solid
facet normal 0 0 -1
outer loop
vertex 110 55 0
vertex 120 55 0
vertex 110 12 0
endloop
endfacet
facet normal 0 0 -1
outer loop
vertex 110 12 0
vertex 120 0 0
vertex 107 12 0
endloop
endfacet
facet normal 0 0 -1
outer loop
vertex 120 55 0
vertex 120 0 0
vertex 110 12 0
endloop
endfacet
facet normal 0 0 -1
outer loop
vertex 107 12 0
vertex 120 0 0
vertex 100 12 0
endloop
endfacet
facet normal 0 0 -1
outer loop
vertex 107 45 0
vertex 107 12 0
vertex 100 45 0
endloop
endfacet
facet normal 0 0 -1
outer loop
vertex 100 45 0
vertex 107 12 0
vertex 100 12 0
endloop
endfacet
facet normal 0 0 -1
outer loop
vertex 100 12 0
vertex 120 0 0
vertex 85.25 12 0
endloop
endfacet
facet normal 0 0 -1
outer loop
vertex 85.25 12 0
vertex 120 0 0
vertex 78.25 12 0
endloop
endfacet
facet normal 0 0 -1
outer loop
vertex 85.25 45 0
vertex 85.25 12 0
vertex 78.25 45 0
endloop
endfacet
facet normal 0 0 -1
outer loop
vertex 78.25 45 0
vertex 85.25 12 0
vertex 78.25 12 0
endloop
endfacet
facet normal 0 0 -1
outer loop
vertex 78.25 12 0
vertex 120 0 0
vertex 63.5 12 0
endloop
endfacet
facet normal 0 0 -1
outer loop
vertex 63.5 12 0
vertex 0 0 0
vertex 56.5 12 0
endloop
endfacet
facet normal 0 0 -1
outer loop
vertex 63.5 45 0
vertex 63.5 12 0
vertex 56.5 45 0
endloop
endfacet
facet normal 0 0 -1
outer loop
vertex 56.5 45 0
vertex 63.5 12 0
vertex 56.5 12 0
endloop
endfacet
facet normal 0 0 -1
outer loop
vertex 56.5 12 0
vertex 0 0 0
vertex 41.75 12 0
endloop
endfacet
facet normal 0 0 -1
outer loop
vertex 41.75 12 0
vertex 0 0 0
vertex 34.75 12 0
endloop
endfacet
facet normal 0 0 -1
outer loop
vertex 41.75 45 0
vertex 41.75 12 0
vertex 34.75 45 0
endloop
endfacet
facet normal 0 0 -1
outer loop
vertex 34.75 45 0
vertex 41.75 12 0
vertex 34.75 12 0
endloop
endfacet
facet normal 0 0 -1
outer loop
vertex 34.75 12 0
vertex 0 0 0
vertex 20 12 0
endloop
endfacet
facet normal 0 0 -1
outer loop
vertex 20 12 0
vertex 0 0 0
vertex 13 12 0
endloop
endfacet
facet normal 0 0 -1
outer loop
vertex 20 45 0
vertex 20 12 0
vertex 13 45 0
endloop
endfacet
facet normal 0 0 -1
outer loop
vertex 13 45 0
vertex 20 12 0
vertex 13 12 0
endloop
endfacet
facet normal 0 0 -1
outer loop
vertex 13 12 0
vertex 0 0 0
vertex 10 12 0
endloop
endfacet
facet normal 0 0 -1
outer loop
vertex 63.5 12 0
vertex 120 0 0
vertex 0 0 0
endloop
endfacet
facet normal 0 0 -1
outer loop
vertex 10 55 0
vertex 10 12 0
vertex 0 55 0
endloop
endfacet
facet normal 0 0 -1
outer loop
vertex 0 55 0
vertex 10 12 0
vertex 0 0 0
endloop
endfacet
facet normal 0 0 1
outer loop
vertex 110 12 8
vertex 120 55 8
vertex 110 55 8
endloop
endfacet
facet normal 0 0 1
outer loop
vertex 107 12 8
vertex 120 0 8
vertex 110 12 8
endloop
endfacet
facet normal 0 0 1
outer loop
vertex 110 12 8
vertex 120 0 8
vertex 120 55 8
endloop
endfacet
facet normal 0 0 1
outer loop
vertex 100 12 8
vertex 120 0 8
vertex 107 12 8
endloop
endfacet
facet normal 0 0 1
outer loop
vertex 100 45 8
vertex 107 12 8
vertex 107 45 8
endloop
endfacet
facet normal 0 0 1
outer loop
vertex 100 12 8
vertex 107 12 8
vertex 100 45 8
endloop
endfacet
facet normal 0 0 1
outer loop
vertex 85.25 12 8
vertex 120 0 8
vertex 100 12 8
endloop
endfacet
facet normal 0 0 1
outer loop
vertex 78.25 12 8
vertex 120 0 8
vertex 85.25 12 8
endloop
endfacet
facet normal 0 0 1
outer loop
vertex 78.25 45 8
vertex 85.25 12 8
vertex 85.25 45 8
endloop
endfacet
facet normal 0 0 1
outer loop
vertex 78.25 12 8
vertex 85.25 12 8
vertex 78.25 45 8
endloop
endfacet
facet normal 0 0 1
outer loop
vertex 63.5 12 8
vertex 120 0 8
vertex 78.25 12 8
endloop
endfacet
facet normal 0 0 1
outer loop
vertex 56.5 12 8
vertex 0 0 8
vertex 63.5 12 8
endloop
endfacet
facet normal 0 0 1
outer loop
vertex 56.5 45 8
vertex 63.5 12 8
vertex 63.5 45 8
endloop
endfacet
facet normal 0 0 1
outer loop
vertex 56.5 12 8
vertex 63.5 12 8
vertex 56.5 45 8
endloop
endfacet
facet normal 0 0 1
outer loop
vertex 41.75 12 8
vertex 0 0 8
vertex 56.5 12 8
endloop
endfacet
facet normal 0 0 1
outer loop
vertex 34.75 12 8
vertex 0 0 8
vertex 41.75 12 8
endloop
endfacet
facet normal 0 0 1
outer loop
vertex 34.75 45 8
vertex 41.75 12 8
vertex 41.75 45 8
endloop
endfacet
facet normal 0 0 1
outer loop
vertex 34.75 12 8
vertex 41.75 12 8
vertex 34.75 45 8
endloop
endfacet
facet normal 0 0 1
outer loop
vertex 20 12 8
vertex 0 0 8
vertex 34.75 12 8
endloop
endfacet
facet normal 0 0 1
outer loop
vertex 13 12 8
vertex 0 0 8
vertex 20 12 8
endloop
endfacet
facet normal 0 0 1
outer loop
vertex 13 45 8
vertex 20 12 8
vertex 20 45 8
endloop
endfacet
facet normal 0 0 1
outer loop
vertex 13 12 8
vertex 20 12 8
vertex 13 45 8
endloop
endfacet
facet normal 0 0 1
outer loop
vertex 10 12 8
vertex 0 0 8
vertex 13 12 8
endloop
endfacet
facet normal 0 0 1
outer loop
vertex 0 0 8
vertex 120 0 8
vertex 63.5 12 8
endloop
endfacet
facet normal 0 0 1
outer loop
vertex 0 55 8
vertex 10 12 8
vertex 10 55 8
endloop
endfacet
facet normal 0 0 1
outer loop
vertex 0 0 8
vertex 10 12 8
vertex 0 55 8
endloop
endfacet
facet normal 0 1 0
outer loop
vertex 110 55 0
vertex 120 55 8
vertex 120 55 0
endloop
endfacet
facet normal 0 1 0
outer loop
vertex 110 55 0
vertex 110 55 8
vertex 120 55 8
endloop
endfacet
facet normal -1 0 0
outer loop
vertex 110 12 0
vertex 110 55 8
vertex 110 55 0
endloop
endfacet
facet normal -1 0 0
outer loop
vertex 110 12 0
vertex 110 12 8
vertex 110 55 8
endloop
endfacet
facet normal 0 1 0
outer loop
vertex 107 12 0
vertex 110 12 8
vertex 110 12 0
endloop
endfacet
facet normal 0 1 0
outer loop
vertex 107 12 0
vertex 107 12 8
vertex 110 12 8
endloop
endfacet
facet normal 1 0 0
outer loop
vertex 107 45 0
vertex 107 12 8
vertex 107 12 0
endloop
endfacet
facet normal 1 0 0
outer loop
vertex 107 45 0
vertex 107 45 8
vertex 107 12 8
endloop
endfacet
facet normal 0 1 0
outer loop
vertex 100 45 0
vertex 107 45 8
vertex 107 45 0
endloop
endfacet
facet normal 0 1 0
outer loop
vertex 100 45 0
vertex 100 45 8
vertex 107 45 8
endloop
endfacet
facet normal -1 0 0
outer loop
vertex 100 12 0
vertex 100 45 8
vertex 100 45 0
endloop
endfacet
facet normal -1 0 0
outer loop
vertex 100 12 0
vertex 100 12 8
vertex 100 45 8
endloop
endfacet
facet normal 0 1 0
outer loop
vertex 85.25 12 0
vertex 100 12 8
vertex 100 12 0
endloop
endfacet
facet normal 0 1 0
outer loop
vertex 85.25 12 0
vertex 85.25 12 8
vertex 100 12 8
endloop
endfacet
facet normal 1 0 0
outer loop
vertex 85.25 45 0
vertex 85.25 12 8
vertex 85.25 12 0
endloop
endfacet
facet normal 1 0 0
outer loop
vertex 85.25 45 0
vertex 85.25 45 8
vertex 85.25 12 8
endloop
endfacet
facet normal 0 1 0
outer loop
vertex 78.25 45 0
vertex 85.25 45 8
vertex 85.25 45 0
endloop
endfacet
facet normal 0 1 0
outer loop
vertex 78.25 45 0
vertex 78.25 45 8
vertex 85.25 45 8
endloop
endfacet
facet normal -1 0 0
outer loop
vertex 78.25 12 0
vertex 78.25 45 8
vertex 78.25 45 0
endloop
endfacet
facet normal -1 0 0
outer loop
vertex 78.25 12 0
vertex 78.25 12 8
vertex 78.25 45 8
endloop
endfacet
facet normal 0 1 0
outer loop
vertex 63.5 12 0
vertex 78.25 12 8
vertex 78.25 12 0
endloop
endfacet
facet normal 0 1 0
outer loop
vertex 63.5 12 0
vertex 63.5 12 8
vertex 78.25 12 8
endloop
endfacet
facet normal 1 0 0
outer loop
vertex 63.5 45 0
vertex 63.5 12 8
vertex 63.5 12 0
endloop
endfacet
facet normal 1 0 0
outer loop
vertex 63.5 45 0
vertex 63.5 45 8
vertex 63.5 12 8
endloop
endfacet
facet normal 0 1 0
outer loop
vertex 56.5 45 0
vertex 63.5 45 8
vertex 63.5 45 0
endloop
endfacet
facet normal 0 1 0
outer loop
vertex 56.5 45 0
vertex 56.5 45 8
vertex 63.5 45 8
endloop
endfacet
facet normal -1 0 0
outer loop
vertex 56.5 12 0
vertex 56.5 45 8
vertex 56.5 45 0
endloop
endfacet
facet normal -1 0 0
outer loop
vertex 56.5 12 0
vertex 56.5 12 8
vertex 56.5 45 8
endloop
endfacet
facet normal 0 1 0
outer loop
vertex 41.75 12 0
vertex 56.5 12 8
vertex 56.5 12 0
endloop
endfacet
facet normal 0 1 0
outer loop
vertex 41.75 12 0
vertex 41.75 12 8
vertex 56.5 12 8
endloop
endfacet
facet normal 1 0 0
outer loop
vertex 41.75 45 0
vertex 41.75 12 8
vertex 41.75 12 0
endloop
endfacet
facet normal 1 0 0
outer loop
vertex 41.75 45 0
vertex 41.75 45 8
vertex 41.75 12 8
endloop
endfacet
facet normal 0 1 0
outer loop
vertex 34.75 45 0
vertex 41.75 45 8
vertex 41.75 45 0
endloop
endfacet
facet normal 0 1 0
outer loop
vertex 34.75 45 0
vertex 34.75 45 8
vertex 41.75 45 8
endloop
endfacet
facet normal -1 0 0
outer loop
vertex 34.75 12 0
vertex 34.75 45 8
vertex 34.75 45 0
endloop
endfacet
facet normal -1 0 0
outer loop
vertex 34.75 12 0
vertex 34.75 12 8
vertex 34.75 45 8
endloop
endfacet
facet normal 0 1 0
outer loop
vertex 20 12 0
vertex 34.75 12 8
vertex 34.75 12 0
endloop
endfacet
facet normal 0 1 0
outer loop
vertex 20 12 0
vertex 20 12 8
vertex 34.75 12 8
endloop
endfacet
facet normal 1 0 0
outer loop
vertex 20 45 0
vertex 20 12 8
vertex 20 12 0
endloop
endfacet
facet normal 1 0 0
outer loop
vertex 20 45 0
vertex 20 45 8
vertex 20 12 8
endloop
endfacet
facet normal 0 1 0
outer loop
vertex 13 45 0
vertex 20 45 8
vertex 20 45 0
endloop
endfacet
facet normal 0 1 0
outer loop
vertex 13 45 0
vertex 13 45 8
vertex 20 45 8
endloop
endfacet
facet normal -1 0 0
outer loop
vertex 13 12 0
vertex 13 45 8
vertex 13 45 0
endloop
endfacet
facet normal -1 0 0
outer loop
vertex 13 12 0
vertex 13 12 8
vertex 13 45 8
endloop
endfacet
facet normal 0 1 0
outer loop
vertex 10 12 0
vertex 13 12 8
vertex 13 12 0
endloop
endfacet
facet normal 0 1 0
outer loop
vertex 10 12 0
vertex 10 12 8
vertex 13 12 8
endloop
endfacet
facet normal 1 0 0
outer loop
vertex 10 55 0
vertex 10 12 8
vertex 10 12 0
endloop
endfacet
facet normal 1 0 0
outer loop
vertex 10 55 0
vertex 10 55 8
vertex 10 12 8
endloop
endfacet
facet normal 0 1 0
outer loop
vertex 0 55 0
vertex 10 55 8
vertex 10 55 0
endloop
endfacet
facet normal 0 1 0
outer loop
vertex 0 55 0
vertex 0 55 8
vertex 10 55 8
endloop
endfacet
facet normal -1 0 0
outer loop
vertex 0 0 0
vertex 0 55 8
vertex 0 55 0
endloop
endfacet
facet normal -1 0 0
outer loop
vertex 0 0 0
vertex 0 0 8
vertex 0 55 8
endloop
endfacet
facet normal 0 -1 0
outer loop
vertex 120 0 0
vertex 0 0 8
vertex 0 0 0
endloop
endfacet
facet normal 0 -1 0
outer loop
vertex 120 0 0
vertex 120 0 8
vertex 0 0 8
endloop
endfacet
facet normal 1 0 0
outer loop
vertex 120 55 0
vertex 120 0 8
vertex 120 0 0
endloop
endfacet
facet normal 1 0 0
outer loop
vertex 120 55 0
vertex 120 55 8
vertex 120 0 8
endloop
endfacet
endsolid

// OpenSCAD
$fn = 32;

// ----------------------------------------------------------------------
// Guard grille: 5 slats over a 120 x 55 mm plate
// ----------------------------------------------------------------------

// --- parameters (mm) ---
profile_height = 8;       // extrusion height
profile_points = 28;      // points of the closed outline

profile = [[0, 0], [120, 0], [120, 55], [110, 55], [110, 12], [107, 12], [107, 45], [100, 45], [100, 12], [85.25, 12], [85.25, 45], [78.25, 45], [78.25, 12], [63.5, 12], [63.5, 45], [56.5, 45], [56.5, 12], [41.75, 12], [41.75, 45], [34.75, 45], [34.75, 12], [20, 12], [20, 45], [13, 45], [13, 12], [10, 12], [10, 55], [0, 55]];  // single closed polygon, 28 points, counter clockwise

// --- the one profile operation ---
linear_extrude(height = profile_height) polygon(points = profile);
